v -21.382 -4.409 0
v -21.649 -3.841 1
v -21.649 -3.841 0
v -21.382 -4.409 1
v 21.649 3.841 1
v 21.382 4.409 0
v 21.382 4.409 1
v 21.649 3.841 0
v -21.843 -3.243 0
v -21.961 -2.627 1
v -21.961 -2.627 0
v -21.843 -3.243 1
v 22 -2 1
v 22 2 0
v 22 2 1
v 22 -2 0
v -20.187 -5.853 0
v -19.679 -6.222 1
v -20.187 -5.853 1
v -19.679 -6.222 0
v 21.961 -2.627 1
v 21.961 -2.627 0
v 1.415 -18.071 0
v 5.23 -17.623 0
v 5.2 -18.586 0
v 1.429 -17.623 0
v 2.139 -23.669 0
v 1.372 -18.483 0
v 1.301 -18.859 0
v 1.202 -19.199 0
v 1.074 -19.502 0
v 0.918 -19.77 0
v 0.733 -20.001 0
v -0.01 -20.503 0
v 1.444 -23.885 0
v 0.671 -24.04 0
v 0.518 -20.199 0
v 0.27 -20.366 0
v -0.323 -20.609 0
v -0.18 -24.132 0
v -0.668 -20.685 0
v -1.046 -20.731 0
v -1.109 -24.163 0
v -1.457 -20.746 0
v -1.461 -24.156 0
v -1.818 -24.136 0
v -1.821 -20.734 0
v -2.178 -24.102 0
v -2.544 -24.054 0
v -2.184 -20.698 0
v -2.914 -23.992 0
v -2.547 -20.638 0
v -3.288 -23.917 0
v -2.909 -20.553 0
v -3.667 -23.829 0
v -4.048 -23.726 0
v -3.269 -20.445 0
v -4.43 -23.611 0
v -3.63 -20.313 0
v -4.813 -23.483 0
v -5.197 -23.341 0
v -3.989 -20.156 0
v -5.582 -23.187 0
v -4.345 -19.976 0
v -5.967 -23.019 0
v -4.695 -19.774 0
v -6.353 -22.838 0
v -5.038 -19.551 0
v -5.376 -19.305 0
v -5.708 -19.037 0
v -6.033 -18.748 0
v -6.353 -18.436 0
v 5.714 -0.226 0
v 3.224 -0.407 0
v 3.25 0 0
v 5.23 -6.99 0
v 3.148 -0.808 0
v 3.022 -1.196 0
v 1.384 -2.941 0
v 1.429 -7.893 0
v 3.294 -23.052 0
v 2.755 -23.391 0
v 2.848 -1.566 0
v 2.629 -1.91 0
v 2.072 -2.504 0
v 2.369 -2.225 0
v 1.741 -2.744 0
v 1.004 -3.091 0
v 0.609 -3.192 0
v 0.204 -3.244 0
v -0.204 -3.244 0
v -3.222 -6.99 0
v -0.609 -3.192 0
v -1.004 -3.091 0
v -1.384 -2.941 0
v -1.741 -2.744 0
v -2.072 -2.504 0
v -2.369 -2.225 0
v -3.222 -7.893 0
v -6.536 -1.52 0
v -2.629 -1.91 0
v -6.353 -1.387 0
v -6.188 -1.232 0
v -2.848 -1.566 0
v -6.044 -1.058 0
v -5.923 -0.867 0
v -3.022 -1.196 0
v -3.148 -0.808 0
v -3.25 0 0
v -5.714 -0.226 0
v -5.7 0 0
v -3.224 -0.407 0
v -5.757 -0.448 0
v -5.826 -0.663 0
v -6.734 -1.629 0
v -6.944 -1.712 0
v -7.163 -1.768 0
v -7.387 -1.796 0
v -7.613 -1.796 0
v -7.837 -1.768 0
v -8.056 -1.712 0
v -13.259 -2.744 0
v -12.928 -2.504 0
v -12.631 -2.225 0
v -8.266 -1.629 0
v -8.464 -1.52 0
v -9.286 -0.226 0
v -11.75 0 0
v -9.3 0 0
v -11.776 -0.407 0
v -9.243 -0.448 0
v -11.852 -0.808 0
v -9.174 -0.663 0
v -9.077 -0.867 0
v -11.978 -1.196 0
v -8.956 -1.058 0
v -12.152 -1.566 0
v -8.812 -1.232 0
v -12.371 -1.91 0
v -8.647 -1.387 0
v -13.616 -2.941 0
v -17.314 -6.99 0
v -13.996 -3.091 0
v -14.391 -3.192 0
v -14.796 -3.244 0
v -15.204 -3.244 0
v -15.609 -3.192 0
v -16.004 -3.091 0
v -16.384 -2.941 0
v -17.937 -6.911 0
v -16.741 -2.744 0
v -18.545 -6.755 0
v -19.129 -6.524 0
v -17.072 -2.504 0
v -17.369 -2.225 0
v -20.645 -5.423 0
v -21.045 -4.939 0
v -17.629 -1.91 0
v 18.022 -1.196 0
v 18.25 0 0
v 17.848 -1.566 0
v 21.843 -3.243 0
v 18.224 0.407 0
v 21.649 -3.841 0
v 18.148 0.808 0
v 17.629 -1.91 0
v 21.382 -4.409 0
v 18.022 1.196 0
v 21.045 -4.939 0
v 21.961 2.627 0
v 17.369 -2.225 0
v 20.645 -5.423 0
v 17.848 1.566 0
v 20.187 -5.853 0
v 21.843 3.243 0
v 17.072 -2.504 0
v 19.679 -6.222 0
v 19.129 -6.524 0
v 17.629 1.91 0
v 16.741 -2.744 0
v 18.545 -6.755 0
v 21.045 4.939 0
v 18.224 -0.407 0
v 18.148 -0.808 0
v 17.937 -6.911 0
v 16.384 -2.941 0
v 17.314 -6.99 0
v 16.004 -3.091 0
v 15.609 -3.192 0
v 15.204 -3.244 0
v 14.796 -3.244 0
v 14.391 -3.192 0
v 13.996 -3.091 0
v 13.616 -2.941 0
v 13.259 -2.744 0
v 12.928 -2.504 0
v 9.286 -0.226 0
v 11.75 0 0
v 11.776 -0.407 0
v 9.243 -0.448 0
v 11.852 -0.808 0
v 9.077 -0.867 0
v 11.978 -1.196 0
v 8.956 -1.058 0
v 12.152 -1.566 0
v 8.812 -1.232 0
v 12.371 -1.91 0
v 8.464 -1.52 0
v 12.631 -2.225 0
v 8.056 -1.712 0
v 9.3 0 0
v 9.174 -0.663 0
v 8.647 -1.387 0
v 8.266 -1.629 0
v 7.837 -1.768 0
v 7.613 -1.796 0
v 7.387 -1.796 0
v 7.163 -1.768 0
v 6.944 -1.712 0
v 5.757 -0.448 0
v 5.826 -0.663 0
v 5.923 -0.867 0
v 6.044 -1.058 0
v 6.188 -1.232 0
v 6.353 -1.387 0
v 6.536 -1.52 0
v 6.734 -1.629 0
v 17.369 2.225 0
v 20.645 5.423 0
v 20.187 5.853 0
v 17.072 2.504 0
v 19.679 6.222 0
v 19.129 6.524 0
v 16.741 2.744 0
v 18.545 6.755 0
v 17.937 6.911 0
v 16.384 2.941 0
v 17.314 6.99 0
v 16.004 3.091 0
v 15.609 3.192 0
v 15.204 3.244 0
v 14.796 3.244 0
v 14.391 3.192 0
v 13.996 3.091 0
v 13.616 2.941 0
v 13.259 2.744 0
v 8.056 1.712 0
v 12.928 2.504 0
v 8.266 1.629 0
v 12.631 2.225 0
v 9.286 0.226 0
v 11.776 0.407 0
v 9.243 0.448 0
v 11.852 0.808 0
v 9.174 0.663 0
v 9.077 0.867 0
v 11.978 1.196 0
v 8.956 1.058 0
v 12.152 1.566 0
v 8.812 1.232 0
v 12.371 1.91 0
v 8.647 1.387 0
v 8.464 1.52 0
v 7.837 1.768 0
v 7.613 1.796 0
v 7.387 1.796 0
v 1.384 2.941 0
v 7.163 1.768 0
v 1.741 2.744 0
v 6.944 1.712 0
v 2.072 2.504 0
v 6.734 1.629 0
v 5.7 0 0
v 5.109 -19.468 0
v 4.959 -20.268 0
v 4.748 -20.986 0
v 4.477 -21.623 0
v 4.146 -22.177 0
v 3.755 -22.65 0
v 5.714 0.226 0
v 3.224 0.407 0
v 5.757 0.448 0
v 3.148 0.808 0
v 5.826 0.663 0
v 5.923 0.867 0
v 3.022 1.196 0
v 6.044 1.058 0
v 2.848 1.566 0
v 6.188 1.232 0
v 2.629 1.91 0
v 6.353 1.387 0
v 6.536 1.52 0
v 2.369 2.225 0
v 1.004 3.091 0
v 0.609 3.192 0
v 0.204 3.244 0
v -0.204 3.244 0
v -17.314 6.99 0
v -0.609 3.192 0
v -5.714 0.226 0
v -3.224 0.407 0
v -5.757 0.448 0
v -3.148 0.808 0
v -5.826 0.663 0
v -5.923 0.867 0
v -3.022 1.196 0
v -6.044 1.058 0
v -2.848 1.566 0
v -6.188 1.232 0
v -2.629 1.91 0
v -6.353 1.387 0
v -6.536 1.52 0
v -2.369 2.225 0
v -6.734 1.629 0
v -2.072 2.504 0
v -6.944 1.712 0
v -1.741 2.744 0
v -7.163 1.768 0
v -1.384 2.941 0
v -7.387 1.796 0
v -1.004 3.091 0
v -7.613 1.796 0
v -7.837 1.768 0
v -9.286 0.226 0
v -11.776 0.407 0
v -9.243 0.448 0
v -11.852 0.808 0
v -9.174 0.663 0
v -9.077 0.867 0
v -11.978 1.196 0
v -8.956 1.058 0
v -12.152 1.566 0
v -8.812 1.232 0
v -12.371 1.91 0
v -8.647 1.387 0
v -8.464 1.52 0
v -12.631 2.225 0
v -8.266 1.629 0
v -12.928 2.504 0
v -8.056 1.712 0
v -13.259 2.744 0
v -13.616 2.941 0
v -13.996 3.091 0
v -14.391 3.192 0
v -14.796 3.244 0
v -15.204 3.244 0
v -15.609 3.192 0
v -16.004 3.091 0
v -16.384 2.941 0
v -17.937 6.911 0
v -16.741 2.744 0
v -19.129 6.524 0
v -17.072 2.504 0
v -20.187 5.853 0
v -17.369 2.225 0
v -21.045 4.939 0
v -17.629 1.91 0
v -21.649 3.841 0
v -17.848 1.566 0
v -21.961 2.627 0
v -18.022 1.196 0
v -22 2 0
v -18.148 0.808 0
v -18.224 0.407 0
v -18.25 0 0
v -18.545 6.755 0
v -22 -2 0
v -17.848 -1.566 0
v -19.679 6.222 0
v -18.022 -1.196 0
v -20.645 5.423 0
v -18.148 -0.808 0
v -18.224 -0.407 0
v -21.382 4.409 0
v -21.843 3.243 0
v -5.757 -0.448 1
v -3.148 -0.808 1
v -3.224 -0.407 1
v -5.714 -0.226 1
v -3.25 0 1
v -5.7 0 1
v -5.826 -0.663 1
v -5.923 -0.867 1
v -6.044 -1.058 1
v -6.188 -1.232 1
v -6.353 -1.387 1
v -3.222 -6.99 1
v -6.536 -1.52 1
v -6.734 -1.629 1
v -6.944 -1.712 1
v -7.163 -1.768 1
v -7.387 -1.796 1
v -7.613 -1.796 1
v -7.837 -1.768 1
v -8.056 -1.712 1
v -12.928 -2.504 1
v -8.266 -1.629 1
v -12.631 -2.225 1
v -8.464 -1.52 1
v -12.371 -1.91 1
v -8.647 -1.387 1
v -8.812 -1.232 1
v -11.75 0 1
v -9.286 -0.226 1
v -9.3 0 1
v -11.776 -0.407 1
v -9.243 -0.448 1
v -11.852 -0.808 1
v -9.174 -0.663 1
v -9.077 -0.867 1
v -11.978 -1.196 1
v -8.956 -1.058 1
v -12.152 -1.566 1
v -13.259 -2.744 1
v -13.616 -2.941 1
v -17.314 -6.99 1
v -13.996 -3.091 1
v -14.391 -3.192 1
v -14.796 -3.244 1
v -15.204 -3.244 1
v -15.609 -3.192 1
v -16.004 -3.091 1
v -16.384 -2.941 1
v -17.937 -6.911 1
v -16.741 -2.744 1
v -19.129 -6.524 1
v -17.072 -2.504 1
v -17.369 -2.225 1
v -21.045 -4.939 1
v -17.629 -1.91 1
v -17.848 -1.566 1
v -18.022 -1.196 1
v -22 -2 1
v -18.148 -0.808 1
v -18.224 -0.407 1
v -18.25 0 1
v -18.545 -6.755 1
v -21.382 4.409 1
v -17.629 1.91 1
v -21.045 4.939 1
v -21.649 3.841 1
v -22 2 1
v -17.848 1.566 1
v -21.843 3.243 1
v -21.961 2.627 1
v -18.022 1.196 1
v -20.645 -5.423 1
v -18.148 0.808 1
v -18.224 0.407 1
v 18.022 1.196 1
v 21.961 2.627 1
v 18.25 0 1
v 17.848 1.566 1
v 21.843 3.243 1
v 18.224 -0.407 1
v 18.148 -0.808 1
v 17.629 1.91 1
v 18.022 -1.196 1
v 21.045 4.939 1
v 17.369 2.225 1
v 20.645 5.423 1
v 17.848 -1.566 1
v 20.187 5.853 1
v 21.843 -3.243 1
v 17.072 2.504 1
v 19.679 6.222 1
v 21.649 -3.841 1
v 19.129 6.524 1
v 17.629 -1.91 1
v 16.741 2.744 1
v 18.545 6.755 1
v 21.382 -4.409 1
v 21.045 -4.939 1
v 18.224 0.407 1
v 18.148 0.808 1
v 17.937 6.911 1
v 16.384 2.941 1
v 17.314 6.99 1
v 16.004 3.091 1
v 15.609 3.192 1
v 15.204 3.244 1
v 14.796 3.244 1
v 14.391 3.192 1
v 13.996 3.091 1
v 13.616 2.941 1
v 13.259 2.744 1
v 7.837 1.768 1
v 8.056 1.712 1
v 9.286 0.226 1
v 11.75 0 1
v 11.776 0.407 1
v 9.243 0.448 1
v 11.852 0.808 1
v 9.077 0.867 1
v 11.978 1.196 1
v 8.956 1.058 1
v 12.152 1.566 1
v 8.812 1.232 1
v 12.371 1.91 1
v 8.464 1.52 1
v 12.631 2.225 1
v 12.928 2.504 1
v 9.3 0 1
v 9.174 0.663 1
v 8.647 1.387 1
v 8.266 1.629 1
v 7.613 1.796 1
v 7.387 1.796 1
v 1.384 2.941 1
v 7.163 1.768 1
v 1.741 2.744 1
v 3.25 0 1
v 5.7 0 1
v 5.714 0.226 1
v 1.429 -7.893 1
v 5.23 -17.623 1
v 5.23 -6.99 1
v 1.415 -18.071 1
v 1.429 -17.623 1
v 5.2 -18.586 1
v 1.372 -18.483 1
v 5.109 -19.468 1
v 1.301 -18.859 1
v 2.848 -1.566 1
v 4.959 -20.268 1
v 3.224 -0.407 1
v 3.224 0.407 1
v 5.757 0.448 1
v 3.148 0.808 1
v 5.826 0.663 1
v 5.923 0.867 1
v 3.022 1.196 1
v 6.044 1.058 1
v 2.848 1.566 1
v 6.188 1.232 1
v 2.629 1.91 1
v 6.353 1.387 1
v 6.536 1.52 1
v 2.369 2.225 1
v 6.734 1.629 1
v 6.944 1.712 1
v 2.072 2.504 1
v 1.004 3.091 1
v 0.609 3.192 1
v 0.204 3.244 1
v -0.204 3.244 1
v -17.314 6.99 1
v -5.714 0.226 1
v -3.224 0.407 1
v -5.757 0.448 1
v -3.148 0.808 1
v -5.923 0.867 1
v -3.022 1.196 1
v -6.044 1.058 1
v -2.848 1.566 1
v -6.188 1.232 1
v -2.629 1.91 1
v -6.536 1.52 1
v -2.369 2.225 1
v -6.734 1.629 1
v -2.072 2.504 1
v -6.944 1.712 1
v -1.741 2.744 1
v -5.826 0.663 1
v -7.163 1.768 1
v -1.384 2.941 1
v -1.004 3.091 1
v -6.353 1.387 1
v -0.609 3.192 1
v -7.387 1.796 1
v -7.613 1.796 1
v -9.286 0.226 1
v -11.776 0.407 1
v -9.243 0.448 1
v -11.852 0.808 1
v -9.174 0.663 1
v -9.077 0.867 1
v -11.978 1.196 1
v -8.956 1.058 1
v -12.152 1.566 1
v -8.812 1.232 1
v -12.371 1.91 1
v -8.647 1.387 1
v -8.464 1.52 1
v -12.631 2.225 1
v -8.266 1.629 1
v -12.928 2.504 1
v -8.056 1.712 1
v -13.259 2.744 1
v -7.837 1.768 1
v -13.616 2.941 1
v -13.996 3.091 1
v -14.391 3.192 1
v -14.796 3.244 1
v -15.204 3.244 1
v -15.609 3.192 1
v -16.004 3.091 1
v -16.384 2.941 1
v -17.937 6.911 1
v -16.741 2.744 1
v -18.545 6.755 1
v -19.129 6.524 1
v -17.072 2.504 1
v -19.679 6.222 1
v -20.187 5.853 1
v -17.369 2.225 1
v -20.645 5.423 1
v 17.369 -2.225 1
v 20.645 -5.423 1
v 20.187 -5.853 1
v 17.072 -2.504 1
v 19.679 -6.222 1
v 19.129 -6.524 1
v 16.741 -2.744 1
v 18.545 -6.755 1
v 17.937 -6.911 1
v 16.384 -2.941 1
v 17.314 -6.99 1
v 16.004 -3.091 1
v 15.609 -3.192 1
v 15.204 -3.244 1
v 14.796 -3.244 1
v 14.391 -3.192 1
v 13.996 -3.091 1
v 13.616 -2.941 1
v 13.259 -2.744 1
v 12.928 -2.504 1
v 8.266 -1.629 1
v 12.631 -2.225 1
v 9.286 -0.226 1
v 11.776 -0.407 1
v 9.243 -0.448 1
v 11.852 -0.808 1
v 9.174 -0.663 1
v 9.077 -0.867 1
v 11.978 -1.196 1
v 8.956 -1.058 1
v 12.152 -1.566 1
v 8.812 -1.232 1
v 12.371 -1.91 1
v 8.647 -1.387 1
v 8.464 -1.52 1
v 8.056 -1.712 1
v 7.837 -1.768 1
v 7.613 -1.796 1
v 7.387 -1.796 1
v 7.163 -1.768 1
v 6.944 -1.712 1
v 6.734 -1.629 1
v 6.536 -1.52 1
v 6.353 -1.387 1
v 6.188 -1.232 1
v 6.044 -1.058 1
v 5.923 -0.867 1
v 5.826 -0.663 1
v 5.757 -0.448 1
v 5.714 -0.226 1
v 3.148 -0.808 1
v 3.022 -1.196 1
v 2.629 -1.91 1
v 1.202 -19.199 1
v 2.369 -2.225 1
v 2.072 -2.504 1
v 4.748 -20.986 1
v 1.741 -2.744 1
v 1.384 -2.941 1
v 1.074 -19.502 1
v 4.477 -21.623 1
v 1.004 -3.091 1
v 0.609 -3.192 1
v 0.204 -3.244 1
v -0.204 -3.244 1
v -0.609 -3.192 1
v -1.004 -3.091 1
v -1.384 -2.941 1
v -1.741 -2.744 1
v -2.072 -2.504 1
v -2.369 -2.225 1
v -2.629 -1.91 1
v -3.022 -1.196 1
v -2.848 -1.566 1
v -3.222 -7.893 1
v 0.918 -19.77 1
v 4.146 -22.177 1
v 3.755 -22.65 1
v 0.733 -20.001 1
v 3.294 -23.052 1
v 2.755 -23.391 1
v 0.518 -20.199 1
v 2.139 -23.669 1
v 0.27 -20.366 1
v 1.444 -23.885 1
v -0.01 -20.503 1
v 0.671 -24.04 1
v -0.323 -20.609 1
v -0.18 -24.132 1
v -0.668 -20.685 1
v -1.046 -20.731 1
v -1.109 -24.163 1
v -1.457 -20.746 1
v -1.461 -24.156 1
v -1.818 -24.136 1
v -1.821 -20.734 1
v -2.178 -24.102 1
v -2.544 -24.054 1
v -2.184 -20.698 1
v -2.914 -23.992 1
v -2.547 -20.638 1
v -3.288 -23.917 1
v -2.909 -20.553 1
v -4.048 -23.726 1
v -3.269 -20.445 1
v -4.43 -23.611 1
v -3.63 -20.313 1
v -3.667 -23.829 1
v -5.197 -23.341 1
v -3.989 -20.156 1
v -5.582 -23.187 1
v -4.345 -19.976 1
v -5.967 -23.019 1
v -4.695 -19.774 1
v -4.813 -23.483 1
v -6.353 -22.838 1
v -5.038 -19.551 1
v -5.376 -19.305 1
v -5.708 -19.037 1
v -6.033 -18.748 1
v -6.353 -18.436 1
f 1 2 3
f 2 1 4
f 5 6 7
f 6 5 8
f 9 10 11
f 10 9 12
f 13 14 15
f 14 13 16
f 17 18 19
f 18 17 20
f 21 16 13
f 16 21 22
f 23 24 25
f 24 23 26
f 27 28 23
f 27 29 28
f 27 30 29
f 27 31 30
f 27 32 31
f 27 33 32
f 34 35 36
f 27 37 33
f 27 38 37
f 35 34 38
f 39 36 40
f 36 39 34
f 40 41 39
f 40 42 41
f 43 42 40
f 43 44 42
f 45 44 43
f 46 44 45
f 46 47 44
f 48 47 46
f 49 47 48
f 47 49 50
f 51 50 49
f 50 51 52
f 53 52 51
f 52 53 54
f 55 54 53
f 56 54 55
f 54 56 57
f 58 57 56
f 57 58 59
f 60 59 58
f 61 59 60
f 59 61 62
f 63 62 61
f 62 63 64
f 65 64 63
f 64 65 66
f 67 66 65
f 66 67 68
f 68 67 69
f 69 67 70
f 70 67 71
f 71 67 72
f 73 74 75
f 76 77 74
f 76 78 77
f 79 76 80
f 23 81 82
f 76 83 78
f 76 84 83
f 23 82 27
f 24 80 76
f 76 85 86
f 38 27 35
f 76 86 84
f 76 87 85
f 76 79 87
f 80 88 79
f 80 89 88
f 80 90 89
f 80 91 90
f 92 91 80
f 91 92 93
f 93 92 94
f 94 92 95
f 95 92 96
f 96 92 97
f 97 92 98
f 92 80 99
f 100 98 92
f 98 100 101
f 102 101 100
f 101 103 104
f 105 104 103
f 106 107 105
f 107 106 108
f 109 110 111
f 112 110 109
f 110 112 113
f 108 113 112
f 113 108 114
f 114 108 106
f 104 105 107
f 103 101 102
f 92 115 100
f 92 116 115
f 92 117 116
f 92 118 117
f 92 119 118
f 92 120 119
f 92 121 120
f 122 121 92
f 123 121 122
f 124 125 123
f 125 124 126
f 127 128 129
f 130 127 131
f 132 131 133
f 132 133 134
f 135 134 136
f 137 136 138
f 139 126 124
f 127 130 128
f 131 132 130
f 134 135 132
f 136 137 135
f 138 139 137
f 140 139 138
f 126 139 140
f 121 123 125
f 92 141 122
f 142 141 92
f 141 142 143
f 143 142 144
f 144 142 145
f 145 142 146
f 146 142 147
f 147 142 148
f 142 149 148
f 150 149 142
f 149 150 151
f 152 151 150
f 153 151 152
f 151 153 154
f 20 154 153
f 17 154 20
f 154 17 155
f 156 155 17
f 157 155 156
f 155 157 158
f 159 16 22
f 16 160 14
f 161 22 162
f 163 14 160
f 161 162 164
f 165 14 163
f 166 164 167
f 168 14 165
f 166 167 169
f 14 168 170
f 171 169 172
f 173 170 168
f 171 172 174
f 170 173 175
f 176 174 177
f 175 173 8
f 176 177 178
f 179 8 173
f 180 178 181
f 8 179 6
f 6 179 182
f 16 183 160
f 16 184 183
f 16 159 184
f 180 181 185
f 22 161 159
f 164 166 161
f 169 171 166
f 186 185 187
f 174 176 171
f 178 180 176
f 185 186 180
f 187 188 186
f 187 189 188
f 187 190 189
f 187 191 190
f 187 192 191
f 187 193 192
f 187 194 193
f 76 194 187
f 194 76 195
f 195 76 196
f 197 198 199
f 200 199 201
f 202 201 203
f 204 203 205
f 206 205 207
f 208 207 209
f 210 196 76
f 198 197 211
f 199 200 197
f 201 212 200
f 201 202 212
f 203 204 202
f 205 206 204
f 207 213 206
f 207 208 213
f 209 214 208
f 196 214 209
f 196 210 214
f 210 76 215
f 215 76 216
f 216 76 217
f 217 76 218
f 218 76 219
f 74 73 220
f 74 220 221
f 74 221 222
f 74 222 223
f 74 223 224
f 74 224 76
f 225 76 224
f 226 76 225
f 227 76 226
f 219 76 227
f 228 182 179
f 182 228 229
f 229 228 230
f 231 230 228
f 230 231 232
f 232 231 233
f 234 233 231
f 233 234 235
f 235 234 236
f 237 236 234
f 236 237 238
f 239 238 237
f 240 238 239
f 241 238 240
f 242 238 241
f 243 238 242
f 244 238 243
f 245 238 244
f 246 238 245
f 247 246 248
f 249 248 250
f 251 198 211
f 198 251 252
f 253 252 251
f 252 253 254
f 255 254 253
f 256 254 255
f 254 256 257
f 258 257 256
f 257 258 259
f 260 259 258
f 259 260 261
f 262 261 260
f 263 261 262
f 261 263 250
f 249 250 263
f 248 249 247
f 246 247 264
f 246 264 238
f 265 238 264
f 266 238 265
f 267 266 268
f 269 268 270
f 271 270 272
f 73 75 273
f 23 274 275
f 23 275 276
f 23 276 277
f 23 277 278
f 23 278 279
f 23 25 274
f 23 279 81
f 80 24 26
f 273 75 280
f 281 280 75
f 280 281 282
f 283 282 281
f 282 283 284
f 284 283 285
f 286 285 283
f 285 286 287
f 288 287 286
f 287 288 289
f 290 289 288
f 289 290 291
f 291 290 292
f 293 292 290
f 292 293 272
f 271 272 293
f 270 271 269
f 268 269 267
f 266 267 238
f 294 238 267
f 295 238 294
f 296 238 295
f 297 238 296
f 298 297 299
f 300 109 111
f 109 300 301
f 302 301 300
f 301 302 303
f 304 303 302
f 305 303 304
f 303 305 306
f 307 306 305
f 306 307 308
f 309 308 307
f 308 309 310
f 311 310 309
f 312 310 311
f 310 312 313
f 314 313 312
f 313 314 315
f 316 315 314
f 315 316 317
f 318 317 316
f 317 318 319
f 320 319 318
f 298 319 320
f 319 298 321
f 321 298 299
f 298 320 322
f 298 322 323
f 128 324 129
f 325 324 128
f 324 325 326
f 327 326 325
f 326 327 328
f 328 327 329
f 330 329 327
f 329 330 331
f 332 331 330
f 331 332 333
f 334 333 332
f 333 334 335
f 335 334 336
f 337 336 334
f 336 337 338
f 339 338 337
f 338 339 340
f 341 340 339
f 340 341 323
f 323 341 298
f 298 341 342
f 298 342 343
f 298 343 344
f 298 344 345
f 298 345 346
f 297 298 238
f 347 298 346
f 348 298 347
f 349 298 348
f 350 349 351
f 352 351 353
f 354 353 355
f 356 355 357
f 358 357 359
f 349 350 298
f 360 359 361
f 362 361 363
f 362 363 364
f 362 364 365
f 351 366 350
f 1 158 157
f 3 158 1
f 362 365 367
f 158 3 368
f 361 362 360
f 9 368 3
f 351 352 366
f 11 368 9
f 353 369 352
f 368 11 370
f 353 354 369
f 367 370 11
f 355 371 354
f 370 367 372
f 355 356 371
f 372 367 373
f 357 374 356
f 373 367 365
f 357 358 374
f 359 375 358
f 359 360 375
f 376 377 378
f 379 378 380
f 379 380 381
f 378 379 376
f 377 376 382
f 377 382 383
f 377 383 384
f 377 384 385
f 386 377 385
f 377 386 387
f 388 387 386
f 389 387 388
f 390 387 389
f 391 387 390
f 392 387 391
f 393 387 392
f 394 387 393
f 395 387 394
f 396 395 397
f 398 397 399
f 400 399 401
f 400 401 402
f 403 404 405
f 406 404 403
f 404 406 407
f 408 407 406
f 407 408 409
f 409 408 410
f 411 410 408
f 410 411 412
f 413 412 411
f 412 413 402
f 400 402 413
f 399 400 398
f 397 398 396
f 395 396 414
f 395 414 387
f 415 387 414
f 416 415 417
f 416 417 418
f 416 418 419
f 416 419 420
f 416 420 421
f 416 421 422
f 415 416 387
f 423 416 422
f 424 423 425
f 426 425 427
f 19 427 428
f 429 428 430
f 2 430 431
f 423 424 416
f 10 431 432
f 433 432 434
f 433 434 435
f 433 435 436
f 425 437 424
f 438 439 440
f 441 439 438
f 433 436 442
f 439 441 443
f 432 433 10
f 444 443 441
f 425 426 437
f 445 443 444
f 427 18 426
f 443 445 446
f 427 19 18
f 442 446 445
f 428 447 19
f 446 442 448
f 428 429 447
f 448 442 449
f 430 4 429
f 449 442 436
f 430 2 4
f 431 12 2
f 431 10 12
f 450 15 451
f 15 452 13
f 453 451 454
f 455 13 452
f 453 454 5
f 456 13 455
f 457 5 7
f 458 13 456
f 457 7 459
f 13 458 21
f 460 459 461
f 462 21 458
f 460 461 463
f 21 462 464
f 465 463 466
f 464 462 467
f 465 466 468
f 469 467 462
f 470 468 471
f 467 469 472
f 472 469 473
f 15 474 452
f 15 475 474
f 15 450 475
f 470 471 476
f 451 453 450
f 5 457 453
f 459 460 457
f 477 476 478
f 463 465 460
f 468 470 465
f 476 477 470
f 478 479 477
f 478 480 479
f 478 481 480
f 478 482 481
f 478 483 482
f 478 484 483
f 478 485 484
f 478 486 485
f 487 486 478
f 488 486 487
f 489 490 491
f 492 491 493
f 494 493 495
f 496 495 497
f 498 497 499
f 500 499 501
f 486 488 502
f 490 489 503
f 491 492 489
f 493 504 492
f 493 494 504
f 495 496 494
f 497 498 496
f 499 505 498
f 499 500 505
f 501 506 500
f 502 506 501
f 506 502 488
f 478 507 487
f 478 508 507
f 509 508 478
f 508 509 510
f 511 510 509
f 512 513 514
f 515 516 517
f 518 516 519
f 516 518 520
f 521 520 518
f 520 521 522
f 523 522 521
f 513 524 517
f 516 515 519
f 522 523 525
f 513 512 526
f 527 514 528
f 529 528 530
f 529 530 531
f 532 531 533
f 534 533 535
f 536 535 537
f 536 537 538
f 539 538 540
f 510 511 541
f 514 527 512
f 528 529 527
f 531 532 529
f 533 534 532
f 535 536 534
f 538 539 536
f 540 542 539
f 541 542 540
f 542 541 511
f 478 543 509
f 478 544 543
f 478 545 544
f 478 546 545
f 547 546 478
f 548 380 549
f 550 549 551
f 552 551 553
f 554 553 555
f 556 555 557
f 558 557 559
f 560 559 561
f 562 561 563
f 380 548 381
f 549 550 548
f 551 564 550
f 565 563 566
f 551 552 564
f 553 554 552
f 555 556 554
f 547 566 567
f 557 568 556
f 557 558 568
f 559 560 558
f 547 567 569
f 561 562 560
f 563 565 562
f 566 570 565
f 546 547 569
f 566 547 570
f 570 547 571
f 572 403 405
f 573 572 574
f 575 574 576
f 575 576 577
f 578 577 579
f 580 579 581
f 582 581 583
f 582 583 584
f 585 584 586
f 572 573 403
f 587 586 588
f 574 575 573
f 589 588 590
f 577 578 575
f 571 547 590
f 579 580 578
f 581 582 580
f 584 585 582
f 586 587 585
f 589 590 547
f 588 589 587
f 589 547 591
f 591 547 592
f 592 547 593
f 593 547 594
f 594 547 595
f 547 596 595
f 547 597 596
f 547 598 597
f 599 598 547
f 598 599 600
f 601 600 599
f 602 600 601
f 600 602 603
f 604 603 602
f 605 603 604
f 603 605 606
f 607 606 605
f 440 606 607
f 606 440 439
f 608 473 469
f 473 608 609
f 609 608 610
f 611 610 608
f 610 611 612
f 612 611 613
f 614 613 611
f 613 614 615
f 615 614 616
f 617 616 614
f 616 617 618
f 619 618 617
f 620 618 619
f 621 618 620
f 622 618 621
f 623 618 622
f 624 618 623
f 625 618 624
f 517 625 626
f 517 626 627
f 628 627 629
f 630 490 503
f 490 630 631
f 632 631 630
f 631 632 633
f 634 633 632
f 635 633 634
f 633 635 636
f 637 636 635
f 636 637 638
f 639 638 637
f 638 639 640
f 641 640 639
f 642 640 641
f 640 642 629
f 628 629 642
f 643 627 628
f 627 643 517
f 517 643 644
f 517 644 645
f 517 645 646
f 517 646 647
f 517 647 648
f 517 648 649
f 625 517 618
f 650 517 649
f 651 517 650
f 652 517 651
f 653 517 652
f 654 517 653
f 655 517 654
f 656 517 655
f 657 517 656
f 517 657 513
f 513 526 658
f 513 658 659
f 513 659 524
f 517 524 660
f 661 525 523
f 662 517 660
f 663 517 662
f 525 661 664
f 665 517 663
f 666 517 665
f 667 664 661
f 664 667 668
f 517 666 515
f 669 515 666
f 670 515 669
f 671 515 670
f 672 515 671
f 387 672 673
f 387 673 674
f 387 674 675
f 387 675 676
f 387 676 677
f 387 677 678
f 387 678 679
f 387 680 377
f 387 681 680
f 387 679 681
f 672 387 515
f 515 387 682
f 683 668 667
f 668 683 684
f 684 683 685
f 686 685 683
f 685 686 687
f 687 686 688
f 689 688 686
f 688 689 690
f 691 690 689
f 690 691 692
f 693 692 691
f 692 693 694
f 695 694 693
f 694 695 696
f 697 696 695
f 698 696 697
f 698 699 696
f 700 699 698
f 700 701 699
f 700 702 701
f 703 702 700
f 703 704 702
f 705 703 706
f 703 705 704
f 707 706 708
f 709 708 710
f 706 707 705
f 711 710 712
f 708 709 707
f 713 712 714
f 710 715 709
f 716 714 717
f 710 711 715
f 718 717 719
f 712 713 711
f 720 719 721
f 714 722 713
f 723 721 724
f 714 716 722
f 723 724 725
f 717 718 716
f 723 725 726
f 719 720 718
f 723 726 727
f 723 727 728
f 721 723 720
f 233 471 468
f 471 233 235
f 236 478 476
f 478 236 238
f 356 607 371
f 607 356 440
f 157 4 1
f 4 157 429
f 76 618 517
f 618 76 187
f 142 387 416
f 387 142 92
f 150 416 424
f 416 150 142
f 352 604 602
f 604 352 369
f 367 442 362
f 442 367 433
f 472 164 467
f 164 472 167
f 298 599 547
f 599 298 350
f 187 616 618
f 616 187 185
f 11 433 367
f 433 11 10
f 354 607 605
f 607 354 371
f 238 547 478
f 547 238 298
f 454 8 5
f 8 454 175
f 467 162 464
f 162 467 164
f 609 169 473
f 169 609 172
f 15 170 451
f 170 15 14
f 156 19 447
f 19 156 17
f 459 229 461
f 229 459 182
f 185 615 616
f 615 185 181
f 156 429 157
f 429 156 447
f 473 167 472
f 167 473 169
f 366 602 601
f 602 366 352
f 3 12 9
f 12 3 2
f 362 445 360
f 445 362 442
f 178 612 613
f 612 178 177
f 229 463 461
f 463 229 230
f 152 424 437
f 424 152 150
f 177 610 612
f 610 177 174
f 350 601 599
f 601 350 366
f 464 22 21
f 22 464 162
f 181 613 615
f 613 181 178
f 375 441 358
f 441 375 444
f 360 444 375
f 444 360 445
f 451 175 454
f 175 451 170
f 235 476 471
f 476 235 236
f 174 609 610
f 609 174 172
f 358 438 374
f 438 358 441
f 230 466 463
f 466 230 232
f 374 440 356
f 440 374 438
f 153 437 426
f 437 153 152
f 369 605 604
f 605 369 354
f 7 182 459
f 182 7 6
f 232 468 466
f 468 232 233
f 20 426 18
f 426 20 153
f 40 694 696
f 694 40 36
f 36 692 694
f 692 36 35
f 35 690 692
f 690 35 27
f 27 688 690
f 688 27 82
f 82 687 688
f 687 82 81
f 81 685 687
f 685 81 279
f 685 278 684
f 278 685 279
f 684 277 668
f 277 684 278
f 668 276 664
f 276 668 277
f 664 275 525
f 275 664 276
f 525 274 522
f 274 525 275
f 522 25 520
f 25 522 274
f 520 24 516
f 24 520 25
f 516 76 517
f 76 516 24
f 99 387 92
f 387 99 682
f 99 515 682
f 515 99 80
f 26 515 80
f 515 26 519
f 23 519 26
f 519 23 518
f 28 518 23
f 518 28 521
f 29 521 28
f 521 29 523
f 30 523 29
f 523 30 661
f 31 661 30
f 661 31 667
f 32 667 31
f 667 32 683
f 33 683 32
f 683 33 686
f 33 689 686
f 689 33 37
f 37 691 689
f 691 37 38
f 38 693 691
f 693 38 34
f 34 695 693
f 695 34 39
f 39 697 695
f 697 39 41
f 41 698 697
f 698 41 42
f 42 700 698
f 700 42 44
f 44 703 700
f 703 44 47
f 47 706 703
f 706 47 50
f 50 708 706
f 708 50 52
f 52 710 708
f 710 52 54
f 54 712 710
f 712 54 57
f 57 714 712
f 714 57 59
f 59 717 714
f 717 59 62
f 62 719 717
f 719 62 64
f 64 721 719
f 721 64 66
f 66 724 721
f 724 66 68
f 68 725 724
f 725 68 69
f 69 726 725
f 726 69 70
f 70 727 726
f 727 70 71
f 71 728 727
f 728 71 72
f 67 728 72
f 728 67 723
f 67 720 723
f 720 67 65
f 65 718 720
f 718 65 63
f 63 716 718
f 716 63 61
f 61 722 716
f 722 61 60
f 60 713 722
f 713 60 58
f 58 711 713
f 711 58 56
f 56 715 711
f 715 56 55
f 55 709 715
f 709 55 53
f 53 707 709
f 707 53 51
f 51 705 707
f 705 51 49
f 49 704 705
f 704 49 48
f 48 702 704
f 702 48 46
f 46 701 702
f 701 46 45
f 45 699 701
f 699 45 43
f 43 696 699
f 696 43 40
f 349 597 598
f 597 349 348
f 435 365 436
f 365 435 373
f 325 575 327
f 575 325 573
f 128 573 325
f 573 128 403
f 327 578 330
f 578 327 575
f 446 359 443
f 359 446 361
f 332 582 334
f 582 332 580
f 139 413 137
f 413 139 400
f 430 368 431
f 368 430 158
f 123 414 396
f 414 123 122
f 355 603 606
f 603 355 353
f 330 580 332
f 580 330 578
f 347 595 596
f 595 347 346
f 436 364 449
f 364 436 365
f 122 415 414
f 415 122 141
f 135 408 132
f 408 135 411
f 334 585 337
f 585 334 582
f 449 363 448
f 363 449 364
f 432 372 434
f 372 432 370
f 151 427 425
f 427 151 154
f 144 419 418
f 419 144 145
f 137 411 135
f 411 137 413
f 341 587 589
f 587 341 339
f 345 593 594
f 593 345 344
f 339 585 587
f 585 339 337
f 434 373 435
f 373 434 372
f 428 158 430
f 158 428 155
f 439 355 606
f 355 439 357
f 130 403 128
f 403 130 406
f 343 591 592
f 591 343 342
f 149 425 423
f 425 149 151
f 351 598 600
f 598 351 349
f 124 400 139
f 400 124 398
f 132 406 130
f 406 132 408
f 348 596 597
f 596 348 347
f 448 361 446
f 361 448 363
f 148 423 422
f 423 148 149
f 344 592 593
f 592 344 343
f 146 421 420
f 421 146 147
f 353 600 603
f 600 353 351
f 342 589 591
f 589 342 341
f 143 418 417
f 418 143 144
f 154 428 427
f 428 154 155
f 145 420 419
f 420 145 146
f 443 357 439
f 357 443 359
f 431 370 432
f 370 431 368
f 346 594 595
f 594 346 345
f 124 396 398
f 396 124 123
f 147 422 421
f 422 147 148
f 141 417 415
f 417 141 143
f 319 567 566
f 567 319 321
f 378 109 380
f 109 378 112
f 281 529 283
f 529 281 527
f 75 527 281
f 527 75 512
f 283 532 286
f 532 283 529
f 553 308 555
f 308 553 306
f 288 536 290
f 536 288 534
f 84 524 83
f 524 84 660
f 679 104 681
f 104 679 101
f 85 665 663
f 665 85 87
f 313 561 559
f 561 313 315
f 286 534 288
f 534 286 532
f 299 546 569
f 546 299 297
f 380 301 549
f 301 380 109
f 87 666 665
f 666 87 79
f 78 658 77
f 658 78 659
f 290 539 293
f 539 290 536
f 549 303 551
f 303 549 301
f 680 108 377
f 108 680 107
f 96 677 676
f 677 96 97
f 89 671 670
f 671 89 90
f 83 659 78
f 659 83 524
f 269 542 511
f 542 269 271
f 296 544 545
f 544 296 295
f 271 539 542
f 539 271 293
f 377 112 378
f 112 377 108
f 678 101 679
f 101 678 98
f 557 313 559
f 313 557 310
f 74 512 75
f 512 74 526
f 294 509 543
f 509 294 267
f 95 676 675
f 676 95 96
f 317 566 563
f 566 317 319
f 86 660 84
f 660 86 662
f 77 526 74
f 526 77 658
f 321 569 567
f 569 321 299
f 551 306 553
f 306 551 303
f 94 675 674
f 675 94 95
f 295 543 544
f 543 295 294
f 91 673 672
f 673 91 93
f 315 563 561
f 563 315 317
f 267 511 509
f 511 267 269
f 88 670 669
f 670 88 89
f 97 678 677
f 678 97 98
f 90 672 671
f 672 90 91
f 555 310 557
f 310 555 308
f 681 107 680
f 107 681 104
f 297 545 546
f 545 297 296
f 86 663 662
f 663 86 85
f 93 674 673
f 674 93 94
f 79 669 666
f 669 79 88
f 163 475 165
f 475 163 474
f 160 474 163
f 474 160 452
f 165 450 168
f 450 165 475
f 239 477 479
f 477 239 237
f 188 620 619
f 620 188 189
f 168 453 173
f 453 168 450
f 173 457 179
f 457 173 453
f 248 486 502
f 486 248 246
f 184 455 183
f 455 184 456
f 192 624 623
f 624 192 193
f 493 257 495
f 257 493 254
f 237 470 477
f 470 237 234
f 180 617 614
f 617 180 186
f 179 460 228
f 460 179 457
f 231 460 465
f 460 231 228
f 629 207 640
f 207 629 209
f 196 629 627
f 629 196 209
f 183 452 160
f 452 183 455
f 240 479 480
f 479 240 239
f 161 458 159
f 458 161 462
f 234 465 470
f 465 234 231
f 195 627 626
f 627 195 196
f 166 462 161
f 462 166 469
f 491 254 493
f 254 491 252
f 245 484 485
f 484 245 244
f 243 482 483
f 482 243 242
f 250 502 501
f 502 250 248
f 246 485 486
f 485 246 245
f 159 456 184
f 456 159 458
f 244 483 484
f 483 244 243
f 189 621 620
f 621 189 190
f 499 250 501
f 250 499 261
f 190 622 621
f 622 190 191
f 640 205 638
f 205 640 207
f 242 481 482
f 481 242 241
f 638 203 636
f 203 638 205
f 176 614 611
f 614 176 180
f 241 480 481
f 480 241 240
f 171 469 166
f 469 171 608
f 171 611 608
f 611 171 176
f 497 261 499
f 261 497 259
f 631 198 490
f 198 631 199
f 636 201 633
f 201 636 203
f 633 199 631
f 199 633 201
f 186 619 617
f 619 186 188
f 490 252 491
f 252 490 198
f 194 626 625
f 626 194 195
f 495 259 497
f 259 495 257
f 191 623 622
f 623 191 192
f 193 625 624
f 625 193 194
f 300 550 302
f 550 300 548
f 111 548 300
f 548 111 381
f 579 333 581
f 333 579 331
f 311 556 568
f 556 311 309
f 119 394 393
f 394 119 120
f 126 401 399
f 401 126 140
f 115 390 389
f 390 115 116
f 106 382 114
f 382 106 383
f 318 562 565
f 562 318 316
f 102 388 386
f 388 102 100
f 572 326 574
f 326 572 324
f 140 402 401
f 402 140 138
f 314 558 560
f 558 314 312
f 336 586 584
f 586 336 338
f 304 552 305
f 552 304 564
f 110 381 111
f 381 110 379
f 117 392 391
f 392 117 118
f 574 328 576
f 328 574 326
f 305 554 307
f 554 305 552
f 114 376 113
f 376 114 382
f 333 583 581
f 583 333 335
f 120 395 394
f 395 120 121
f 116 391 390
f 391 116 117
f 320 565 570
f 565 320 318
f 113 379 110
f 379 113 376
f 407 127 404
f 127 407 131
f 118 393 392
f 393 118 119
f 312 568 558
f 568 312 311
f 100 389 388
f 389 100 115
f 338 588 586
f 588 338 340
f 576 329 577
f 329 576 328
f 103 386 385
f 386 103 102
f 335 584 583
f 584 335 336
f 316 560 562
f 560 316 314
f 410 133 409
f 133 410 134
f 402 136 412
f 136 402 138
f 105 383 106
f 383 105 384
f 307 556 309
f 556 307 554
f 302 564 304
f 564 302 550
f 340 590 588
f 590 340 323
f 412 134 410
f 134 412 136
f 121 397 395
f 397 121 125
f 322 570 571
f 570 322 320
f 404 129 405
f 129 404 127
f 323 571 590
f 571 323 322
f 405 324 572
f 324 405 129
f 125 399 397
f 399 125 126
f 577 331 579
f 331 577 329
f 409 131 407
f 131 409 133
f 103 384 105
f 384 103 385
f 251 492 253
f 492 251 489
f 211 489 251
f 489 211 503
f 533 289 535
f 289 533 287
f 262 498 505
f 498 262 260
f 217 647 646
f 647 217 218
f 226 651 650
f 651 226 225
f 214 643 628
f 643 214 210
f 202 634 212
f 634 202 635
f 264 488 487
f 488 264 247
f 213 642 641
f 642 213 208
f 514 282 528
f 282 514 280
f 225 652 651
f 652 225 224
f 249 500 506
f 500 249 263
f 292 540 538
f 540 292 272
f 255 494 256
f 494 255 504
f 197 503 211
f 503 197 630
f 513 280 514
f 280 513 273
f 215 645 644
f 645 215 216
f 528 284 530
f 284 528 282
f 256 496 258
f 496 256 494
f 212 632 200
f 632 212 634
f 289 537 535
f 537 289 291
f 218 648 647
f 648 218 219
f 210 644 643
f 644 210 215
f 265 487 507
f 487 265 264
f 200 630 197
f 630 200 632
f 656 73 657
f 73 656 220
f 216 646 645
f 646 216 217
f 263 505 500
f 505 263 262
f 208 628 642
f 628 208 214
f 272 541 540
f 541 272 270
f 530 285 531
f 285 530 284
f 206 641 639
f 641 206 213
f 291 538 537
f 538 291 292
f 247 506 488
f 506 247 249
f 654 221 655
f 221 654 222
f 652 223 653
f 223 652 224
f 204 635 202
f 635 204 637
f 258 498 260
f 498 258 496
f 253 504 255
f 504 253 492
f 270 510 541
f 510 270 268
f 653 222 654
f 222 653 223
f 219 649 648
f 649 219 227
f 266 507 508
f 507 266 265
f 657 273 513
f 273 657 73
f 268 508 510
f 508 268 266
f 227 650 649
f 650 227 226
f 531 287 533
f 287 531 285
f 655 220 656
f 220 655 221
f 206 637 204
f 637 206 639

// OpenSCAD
$fn = 50;


difference() {
	union() {
		*color(alpha = 1.0000000000, c = "gray") {
			translate(v = [0, 14, 0]) {
				linear_extrude(height = 1) {
					text(font = "Arial:style=Bold", halign = "center", size = 4.5000000000, text = "COMMENT description oobb_plate_shape_p_type_1_depth_3_width_1_thickness_j_extra_oobb_size", valign = "center");
				}
			}
		}
		hull() {
			translate(v = [-17.0000000000, 2.0000000000, 0]) {
				cylinder(h = 1, r = 5);
			}
			translate(v = [17.0000000000, 2.0000000000, 0]) {
				cylinder(h = 1, r = 5);
			}
			translate(v = [-17.0000000000, -2.0000000000, 0]) {
				cylinder(h = 1, r = 5);
			}
			translate(v = [17.0000000000, -2.0000000000, 0]) {
				cylinder(h = 1, r = 5);
			}
		}
		translate(v = [0, -5, 0]) {
			linear_extrude(height = 1) {
				text(font = "DejaVu Sans Mono:style=Bold", halign = "center", size = 19.0000000000, text = "J", valign = "top");
			}
		}
	}
	union() {
		*color(alpha = 1.0000000000, c = "gray") {
			translate(v = [0, 14, 0]) {
				linear_extrude(height = 1) {
					text(font = "Arial:style=Bold", halign = "center", size = 4.5000000000, text = "COMMENT description oobb_holes_shape_n_type_3_width_1_thickness_j_extra_oobb_size_1_height_'all'_holes_true_both_holes", valign = "center");
				}
			}
		}
		translate(v = [-15.0000000000, 0.0000000000, 0]) {
			translate(v = [0, 0, -50]) {
				cylinder(h = 100, r = 3.2500000000);
			}
		}
		translate(v = [0, 0, -50]) {
			cylinder(h = 100, r = 3.2500000000);
		}
		translate(v = [15.0000000000, 0.0000000000, 0]) {
			translate(v = [0, 0, -50]) {
				cylinder(h = 100, r = 3.2500000000);
			}
		}
		translate(v = [-15.0000000000, 0.0000000000, 0]) {
			translate(v = [0, 0, -50]) {
				cylinder(h = 100, r = 1.8000000000);
			}
		}
		translate(v = [-7.5000000000, 0.0000000000, 0]) {
			translate(v = [0, 0, -50]) {
				cylinder(h = 100, r = 1.8000000000);
			}
		}
		translate(v = [0, 0, -50]) {
			cylinder(h = 100, r = 1.8000000000);
		}
		translate(v = [7.5000000000, 0.0000000000, 0]) {
			translate(v = [0, 0, -50]) {
				cylinder(h = 100, r = 1.8000000000);
			}
		}
		translate(v = [15.0000000000, 0.0000000000, 0]) {
			translate(v = [0, 0, -50]) {
				cylinder(h = 100, r = 1.8000000000);
			}
		}
	}
}
